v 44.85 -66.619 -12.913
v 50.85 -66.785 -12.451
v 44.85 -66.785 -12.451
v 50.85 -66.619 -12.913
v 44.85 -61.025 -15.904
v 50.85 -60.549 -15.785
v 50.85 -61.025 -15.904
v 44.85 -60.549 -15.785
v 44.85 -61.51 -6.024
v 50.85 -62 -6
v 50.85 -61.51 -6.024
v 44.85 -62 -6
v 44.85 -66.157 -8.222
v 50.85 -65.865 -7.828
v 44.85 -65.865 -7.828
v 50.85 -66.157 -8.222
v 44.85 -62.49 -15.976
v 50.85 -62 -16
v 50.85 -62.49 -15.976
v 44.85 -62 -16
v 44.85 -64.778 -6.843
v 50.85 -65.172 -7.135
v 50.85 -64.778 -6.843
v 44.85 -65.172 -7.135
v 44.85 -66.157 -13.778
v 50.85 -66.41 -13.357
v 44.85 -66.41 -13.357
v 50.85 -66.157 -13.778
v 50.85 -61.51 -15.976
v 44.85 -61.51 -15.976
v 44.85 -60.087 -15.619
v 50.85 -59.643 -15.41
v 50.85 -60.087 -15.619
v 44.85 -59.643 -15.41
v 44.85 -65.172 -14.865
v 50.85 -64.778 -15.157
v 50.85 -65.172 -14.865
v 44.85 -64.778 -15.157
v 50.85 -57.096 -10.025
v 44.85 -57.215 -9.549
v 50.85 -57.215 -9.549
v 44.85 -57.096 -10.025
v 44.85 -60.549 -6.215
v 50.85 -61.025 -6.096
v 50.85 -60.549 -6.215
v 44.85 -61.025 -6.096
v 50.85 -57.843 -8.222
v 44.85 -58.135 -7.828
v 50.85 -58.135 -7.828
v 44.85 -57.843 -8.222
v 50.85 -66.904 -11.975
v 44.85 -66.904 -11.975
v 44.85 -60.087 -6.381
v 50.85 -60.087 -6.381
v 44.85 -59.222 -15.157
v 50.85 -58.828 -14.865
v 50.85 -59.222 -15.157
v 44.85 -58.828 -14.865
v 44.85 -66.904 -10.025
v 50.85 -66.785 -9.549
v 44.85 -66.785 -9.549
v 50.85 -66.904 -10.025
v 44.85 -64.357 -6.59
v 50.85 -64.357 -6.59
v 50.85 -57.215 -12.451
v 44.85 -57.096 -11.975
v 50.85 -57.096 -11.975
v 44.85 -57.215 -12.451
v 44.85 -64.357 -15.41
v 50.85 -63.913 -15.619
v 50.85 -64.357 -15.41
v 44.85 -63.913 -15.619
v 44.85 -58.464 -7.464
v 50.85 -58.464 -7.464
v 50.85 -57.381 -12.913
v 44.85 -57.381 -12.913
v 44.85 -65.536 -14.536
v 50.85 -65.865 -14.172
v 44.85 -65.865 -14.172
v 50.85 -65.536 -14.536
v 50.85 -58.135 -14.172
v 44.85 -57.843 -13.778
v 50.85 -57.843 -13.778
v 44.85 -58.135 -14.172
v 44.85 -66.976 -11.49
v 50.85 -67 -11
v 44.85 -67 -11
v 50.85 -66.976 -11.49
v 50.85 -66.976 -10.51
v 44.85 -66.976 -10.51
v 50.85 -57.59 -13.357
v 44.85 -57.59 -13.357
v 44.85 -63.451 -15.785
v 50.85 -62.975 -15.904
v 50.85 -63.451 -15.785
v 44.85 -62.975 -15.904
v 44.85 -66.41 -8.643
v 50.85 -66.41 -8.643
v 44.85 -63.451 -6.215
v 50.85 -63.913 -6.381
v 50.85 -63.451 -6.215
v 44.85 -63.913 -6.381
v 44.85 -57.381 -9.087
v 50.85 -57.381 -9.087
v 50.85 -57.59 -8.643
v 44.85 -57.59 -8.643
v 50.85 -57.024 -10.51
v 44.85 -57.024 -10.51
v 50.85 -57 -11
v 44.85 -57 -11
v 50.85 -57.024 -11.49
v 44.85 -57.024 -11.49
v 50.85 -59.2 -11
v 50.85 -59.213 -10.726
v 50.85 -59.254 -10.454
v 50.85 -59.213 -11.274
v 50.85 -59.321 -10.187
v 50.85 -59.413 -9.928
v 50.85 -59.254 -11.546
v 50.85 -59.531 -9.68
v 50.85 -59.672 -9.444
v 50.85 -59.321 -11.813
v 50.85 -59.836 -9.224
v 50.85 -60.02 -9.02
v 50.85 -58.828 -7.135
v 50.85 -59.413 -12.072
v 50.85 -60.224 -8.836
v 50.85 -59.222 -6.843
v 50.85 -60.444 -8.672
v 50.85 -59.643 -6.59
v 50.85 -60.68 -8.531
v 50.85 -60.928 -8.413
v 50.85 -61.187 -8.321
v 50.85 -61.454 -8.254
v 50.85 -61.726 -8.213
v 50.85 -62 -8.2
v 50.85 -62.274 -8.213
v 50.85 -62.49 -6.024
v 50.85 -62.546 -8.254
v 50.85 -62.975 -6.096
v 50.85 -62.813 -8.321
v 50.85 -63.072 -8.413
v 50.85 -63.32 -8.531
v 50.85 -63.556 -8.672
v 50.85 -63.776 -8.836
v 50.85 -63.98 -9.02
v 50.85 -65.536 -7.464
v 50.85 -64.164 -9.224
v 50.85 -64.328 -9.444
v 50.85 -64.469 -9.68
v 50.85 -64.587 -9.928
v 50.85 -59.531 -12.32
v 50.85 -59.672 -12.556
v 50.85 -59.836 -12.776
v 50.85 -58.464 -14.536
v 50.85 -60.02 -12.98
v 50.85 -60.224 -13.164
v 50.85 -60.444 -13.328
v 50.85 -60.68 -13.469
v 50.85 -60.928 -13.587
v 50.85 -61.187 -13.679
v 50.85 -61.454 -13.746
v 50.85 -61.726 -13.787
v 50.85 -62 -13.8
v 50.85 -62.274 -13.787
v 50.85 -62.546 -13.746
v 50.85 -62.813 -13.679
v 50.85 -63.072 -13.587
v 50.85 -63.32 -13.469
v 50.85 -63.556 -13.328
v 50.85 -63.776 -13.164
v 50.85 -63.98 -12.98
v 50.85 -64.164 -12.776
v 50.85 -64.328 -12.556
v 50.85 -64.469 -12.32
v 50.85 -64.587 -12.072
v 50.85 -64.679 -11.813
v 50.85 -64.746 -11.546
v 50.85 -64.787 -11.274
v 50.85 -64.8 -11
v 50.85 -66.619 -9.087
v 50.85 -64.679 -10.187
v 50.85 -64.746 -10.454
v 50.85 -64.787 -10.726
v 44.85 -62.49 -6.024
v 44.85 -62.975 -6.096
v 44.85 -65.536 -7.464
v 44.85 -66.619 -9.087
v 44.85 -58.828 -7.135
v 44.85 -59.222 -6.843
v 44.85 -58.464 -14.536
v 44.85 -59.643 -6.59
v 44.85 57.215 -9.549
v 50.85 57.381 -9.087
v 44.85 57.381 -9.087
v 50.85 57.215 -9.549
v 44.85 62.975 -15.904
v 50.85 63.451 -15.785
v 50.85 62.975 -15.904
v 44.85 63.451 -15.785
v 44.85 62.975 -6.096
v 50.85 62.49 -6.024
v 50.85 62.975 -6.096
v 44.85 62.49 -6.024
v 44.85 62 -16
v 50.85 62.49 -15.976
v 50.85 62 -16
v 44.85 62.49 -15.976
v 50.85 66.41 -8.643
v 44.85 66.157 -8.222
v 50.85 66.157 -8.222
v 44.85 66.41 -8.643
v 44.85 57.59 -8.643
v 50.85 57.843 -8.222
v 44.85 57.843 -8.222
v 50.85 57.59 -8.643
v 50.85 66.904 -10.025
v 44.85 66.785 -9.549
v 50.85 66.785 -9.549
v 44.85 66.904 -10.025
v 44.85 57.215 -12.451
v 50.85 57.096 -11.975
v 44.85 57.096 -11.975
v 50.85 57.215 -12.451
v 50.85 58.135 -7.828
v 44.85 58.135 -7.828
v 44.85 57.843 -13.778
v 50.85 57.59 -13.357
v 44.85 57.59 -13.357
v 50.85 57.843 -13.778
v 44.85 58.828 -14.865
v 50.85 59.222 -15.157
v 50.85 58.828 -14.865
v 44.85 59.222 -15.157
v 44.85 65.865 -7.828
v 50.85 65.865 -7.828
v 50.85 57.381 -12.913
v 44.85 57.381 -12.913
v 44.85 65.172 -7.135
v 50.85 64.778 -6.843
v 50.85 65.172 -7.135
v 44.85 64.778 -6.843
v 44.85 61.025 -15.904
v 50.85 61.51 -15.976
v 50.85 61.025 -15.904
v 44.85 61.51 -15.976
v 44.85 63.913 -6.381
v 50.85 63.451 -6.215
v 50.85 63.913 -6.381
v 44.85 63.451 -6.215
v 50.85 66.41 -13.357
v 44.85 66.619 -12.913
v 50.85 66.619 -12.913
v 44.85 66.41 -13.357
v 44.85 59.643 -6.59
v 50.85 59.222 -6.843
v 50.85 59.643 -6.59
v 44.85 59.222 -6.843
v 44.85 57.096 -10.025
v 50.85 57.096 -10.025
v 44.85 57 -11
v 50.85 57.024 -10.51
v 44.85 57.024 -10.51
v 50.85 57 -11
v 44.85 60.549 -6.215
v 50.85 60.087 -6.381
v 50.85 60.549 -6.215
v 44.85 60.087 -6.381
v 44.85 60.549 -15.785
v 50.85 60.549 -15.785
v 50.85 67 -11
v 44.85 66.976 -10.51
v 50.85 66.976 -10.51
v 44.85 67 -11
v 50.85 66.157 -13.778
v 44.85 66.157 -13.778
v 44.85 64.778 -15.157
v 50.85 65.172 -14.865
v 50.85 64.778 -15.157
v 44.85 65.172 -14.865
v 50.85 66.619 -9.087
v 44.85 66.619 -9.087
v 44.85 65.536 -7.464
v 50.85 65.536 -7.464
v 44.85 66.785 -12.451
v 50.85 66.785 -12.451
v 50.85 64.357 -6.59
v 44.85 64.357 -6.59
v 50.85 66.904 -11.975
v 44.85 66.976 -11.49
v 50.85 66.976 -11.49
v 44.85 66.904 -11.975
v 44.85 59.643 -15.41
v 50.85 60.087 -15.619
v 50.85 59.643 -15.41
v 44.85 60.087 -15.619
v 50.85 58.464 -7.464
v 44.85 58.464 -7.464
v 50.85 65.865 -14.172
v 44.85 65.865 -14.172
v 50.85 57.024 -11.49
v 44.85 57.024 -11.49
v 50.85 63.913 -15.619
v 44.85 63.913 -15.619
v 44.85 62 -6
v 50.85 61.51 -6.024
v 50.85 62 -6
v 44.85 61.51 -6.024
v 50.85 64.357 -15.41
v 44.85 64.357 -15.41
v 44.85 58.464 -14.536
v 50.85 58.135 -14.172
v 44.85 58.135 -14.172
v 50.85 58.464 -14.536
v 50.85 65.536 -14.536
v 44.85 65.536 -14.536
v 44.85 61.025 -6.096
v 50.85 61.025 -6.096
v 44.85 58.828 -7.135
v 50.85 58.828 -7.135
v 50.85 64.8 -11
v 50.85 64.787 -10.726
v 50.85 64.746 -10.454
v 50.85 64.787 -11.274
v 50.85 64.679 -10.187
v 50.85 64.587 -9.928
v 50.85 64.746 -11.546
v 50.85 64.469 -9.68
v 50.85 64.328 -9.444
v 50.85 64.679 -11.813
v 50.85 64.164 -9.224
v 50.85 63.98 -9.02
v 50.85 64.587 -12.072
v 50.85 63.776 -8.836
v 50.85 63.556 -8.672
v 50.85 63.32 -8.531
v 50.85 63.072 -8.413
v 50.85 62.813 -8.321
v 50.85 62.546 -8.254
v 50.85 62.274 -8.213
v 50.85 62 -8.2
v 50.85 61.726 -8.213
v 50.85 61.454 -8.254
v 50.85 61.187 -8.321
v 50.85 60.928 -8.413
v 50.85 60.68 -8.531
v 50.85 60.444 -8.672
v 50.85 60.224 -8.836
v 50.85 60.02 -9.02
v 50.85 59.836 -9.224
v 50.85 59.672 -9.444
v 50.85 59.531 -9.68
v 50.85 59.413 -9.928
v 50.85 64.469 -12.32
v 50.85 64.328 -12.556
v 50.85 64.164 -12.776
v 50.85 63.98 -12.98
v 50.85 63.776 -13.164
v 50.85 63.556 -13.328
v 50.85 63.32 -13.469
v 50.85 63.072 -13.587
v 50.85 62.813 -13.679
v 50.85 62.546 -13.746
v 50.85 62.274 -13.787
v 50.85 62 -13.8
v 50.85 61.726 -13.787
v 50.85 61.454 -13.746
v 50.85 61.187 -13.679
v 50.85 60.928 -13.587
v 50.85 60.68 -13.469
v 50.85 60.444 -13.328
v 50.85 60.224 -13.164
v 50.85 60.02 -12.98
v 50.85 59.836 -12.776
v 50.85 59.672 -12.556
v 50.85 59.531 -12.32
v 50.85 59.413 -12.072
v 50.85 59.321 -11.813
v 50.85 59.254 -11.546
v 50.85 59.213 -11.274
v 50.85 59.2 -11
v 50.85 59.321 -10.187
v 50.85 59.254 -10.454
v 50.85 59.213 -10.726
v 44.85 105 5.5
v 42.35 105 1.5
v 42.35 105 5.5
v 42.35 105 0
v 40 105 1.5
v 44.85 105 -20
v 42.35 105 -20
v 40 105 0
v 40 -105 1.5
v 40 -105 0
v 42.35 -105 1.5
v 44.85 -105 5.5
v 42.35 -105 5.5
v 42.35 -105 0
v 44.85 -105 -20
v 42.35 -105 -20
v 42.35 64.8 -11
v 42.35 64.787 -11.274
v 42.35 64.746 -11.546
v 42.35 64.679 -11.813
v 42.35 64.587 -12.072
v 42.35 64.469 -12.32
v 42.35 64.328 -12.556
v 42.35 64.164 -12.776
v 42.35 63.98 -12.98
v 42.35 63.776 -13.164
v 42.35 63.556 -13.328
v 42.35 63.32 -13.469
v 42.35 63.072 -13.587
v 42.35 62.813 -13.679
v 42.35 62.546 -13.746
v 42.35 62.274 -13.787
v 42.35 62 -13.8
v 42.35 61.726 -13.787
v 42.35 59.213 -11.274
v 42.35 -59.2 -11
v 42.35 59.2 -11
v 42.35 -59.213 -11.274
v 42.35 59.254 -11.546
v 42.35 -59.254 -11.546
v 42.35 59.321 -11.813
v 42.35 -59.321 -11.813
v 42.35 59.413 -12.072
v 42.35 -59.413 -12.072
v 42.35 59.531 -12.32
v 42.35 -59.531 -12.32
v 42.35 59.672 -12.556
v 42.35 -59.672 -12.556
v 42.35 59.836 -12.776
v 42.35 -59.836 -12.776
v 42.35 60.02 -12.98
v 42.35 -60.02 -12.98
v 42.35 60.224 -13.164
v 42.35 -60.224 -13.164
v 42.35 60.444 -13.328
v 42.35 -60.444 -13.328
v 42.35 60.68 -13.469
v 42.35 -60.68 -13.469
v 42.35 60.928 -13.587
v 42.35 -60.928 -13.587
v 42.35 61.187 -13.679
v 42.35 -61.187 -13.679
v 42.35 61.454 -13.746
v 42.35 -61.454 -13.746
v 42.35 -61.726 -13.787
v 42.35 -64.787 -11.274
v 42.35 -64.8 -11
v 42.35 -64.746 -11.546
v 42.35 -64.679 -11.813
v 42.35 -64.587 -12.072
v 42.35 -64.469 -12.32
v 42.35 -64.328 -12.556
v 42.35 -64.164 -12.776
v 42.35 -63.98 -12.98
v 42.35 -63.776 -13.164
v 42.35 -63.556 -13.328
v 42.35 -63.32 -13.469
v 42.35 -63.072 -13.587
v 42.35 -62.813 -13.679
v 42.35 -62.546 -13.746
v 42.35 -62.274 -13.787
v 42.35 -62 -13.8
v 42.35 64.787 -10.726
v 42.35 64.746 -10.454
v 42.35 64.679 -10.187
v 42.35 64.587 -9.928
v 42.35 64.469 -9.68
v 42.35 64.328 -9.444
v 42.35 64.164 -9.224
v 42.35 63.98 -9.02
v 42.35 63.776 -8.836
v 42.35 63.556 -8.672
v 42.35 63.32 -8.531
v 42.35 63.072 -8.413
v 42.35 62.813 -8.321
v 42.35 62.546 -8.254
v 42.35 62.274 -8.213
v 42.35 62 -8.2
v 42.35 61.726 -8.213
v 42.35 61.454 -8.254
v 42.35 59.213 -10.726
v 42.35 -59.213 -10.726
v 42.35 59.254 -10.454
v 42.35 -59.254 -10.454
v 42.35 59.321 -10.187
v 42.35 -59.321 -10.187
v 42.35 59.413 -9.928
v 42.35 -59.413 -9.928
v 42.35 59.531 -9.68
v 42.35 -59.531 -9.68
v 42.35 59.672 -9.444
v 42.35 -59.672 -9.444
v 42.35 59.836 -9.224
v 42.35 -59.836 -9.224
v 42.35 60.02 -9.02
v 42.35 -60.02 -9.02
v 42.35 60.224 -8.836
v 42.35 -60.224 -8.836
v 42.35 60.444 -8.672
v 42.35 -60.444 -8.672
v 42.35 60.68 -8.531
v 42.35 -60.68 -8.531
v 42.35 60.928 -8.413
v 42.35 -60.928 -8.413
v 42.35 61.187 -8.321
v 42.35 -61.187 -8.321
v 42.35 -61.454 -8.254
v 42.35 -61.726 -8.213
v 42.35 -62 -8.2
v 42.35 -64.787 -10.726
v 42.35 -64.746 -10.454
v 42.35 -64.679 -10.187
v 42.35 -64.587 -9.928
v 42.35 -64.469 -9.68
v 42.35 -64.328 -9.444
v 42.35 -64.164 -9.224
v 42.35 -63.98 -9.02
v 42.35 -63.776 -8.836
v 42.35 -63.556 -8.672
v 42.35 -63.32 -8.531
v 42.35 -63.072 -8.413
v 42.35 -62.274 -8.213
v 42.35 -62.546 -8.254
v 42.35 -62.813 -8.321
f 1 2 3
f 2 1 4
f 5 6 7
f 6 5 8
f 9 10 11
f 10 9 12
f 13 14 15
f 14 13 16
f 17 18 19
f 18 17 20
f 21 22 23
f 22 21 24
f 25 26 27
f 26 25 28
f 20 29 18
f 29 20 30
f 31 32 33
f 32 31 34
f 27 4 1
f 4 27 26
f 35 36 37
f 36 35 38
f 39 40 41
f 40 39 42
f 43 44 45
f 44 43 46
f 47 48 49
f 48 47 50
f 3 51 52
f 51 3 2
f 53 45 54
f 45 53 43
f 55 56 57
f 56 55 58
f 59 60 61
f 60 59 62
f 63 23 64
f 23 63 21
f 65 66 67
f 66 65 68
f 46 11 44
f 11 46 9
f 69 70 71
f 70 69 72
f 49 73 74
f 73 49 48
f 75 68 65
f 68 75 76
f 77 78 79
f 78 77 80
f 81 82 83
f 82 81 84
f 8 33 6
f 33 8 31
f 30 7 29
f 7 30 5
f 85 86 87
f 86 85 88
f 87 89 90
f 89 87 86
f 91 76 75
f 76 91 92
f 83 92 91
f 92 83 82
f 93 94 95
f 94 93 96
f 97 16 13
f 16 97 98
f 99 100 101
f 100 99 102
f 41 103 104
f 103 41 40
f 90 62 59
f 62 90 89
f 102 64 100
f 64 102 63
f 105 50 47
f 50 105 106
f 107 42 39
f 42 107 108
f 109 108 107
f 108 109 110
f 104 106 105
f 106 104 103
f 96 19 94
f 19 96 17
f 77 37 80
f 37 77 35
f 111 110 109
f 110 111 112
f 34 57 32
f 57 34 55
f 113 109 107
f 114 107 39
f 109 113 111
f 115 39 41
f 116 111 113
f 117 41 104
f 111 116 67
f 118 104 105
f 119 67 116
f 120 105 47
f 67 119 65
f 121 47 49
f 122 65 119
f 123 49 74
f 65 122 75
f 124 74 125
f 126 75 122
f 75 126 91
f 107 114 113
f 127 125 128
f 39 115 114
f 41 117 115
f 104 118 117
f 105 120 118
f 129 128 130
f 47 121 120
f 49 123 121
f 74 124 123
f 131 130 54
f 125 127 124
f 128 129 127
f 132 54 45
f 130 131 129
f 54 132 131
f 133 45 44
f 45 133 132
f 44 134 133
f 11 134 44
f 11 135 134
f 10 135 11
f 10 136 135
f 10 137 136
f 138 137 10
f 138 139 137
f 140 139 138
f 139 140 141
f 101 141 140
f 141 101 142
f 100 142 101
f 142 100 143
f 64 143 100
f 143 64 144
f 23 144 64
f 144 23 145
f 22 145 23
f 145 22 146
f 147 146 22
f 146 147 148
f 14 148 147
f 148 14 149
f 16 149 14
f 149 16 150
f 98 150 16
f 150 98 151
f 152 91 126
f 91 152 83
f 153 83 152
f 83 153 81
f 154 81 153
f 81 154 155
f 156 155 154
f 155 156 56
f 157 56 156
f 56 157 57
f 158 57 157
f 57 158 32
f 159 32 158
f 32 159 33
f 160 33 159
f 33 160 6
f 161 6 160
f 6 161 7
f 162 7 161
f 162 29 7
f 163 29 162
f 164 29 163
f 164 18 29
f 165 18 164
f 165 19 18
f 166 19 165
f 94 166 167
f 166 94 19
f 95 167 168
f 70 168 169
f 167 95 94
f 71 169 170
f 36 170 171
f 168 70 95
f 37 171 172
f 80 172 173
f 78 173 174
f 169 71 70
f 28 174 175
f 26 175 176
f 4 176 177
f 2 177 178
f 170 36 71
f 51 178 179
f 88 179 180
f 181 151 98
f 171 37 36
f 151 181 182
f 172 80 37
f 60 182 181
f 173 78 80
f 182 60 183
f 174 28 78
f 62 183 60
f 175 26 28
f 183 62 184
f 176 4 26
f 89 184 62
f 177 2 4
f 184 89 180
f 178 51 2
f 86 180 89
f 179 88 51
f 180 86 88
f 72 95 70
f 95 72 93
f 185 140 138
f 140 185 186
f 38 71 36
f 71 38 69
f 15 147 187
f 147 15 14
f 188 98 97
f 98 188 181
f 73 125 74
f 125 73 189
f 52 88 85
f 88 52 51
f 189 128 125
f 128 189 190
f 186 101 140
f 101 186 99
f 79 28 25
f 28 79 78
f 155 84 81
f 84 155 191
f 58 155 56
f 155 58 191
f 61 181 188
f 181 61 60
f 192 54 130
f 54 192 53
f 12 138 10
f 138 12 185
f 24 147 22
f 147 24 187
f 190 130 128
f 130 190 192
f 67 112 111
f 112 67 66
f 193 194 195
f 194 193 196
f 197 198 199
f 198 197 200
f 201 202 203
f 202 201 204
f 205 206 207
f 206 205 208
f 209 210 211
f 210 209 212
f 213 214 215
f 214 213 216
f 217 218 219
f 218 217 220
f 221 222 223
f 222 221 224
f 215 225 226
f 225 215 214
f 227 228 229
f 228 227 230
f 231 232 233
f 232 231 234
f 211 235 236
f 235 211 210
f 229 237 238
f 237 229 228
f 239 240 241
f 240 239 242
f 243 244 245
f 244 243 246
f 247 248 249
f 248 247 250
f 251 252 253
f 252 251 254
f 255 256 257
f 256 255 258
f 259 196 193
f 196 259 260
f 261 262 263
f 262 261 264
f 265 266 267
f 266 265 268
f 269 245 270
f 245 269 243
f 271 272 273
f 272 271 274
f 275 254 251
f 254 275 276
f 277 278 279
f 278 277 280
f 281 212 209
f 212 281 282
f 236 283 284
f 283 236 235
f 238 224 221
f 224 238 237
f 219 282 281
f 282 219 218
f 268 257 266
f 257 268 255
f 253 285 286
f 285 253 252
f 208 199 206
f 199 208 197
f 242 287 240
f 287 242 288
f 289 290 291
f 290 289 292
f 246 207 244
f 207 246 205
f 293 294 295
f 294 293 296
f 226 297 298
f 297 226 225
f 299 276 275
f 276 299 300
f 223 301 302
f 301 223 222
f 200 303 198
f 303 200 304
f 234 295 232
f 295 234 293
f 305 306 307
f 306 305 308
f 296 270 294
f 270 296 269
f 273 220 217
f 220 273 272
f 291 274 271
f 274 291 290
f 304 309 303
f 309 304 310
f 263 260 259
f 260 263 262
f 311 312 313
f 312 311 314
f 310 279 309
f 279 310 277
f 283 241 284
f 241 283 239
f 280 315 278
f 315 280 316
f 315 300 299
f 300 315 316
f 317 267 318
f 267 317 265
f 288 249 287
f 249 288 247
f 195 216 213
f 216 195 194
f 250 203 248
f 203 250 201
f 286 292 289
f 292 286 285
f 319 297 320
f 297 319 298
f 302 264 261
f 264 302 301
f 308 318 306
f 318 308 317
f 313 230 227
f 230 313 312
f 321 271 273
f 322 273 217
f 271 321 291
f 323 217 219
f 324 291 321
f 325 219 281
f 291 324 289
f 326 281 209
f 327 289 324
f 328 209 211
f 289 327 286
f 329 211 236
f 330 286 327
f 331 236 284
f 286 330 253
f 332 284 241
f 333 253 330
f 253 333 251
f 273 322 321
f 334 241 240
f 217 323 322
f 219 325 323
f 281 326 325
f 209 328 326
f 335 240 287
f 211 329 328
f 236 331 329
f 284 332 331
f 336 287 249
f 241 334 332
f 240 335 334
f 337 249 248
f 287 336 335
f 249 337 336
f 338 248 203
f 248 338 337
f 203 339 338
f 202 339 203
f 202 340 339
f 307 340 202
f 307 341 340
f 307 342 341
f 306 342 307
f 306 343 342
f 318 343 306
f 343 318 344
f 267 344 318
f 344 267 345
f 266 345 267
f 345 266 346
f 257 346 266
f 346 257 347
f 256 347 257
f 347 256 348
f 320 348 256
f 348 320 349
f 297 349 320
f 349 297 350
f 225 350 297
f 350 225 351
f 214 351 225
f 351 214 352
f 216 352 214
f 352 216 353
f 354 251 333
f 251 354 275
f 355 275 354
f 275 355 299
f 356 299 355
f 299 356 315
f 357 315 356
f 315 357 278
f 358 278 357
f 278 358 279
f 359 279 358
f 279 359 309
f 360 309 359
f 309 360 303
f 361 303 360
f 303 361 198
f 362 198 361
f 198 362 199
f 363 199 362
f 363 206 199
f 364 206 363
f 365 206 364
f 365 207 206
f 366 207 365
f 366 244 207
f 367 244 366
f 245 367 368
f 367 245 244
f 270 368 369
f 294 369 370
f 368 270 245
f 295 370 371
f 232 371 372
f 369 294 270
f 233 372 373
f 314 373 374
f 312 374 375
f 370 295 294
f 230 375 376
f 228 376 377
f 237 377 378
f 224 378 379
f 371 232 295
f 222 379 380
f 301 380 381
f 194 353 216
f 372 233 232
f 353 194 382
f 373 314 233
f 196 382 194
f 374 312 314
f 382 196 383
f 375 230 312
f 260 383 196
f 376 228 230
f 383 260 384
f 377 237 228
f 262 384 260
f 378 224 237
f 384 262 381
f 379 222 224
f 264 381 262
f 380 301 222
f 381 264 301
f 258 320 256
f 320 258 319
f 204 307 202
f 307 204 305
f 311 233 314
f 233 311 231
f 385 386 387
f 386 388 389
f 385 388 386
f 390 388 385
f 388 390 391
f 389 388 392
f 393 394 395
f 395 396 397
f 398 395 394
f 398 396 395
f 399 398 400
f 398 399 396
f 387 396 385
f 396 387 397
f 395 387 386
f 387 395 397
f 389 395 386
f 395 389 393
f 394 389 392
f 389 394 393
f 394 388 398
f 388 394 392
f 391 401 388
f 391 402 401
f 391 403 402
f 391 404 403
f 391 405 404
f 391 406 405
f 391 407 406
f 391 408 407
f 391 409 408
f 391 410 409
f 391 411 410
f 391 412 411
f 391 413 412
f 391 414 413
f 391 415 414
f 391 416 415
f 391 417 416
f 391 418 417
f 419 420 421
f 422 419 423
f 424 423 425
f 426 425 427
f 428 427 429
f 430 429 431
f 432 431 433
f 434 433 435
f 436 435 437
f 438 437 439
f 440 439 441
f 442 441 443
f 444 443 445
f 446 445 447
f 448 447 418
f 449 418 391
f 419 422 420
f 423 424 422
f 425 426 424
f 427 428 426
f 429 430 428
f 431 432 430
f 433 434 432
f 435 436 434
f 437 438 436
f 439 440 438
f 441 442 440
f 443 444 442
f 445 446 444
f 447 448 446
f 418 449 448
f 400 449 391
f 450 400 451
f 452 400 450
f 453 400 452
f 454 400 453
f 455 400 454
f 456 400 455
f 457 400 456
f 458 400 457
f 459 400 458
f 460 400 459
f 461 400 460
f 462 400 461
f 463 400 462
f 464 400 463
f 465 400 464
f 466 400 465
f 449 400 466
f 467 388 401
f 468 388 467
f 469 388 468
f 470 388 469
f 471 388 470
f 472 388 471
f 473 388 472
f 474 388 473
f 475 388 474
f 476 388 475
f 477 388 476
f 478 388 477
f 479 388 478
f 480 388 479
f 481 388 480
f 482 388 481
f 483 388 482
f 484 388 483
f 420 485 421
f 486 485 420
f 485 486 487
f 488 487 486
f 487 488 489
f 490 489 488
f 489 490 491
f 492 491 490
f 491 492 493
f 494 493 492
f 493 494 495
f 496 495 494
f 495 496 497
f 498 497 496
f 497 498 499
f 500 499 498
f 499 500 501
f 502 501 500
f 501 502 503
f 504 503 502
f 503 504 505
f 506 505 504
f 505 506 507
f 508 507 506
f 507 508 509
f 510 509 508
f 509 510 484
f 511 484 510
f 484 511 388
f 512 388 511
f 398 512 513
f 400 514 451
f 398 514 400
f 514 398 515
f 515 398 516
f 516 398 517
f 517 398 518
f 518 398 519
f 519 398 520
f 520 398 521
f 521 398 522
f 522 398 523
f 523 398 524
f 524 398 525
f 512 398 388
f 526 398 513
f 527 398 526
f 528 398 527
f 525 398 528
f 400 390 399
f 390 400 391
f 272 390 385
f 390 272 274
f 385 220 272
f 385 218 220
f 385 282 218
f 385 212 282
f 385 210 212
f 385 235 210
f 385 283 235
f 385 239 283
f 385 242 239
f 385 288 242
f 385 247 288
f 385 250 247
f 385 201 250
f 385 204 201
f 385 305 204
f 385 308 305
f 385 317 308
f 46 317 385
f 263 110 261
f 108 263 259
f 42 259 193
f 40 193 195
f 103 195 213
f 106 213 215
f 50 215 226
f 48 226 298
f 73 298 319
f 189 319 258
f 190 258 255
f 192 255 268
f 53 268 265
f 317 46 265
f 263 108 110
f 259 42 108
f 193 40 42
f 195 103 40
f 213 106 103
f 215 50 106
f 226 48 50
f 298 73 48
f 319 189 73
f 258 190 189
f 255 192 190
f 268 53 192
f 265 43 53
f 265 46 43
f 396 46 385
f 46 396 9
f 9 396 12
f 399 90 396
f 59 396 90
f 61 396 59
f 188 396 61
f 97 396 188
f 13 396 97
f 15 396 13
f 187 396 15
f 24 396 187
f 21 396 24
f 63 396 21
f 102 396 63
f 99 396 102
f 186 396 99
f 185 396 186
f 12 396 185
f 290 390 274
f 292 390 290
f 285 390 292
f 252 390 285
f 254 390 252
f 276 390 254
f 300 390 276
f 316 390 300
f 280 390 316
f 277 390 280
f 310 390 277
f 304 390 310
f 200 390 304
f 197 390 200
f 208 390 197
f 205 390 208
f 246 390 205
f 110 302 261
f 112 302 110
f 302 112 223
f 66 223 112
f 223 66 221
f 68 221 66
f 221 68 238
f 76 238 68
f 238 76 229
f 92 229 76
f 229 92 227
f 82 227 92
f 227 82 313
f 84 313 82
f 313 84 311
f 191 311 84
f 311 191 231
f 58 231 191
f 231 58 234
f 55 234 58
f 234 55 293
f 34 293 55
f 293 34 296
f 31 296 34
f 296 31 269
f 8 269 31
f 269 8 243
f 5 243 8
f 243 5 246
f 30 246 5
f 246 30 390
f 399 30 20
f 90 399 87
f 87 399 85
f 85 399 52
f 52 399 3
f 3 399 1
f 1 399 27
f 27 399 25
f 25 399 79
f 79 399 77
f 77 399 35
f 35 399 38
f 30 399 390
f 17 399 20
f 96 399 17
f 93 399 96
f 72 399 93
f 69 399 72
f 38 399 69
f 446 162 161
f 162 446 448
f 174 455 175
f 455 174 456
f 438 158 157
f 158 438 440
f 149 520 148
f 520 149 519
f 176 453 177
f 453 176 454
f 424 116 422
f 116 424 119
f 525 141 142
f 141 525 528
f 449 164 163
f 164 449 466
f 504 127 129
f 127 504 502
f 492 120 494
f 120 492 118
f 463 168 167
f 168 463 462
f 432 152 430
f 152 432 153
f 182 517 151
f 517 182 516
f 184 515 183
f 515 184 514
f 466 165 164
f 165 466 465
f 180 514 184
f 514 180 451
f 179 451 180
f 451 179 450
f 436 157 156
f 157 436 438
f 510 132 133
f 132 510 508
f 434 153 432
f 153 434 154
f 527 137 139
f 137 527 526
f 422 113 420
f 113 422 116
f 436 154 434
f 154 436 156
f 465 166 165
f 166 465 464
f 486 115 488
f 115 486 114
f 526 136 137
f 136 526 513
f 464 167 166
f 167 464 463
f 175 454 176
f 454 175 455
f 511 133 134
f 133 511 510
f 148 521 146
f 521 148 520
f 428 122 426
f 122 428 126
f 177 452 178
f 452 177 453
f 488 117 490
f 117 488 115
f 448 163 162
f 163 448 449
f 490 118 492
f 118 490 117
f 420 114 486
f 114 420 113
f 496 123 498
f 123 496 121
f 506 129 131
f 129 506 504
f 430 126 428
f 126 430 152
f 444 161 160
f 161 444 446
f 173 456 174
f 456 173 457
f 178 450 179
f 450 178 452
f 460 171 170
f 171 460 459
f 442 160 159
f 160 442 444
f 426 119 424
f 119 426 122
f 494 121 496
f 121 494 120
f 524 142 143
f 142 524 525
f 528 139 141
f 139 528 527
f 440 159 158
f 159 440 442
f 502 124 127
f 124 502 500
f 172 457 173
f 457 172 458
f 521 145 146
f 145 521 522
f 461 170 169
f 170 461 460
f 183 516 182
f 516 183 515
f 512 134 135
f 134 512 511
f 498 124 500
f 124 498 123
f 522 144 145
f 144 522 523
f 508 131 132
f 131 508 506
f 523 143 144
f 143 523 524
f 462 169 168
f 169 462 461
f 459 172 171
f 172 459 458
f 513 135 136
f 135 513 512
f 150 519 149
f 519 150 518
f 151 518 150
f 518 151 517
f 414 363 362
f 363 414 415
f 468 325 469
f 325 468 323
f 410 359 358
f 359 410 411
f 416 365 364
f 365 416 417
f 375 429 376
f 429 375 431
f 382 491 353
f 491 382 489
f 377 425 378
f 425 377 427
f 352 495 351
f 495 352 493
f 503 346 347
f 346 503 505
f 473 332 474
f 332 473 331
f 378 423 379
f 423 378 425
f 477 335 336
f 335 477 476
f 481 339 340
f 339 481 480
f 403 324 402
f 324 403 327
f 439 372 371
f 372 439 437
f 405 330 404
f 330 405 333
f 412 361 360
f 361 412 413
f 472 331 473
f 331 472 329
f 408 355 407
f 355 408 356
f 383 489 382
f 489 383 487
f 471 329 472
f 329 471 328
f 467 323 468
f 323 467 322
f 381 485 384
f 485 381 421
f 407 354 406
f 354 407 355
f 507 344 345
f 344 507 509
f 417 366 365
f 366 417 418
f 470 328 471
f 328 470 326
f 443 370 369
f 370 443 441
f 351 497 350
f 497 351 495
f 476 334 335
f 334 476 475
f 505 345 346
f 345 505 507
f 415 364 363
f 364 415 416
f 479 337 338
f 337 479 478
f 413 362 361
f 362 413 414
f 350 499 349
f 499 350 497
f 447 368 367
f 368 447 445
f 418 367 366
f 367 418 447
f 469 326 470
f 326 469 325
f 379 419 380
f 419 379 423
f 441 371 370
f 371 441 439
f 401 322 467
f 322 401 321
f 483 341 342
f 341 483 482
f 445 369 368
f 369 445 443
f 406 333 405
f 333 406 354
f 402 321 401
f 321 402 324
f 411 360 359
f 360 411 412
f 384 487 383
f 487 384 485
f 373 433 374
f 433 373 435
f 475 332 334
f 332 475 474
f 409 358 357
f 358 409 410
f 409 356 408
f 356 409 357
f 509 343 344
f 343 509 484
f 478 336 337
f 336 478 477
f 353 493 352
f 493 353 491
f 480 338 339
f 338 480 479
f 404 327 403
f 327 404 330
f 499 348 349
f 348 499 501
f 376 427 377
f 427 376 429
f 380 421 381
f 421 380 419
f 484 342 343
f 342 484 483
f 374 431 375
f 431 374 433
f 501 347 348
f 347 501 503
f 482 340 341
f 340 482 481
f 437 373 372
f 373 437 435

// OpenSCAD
// file: owon_tray_common.scad
// owon_tray_common.scad — shared dimensions for the OWON SPM8104 top tray.
//
// Measured on the actual unit (the datasheet's 82 mm width is WRONG):
//   lid width  84.30 mm  (calipers)
//   lid length ~226 mm   (flat all the way to the plastic front bezel)
//   height     142 mm    (spec)
//   venting    rear fan + side slots low on the case — skirts stay well above
//
// The 84.30 mm width is the happy accident that makes this work: a 2-cell
// Clickfinity plate is exactly 84.00 mm, so it sits flush with ~0.15 mm of case
// showing per side. 5 cells (210 mm) fits the length with ~16 mm to spare.

/* [Case] */
CASE_W   = 84.30;  // measured lid width
CASE_CLR = 0.40;   // total slip clearance so the clamp drops on

/* [Tray] */
GX = 2;            // cells across (84.00 mm — flush on the lid)
GY = 5;            // cells deep  (210 mm)
PLATE_H_ = 4.00;   // must match PLATE_H in lib/clickfinity.scad

/* [Clamp rail] */
SKIRT_T     = 2.50;  // skirt wall thickness
SKIRT_D     = 20.0;  // how far the skirt drops down the case side.
                     //   Keep SHORT — the side vents sit lower down the case.
// NOTE: the rail supports the plate from BELOW, it does not hook over it.
// A Gridfinity bin is 41.5 mm in a 42 mm cell — only 0.25 mm of plate rim per
// side. There is nothing to clamp over: any inward flange lands on top of the
// outer-row bins and stops them seating. So: a lip under the plate edge, and an
// upstand beside it.
LIP_IN   = 2.00;   // how far the lip reaches inward under the plate edge
LIP_T    = 1.50;   // lip thickness — the plate rides this far above the lid
RAIL_LEN    = GY*42; // rail runs the full plate length

/* [Clamp screws — M4 heat-set insert + M4 machine screw] */
// The boss takes a brass M4 heat-set insert (you have the M2–M6 kit); an M4
// machine screw threads through it and its tip presses the case. VERIFY HS_D
// against your actual inserts — install diameter varies by brand (a common M4
// heat-set wants ~5.6 mm; measure yours or check the insert datasheet).
HS_D       = 5.60;   // heat-set insert install hole diameter (M4) — VERIFY
HS_L       = 8.00;   // insert length (bore depth from the outer boss face)
BOSS_OD    = 10.0;   // boss outer diameter
BOSS_EXT   = 6.00;   // how far the boss stands off the outer skirt face
SCREW_Z    = -11.0;  // screw height on the skirt (below the lid line)
SCREW_Y    = 62.0;   // +/- screw position along the rail
// Use an M4 machine screw ~16–20 mm long. A stick-on rubber/felt dot on the tip
// keeps it from marring the case.

// Derived
PLATE_W  = GX*42;
PLATE_L  = GY*42;
SKIRT_IN = CASE_W/2 + CASE_CLR/2;   // inner face of the skirt
SKIRT_OUT= SKIRT_IN + SKIRT_T;
// main file
// owon_tray_rail.scad — clamp rail for the OWON SPM8104 top tray.
//
// Part 2 of 2. **Print TWO** (identical, one per side).
//
// Each rail is a hook in section: a lip the tray plate rests on, an upstand that
// captures the plate sideways, and a skirt down the case side. Two M4 machine
// screws per rail (threaded into brass heat-set inserts) press against the case;
// tightening squeezes the case between the two rails AND pins the plate down.
// Nothing pierces the plate, nothing is glued to the instrument, and the whole
// thing lifts off when you back the screws out.
//
// ASSEMBLY: heat an M4 brass insert into each boss (from the OUTER face), then
// thread an M4 machine screw (~16–20 mm) through it. Rubber/felt dot on the tip.
//
// Why screws and not a snap-on friction clamp: PETG creeps under sustained
// tension. A spring clamp would be tight in week one and loose by month three.
// A screw is a positive grip with no standing load — and it absorbs the
// dimensional slop you get between a datasheet and a real case.
//
// PRINT: lay it on the skirt's OUTER face (flange pointing up) — prints as an
// L on its back, no supports. PETG or PLA both fine here; this part isn't a
// spring. Add a felt/rubber dot on each screw tip so it doesn't mar the case.

include <owon_tray_common.scad>

$fn = 64;

// Cross-section in (x, z). The plate rides on the LIP and is captured laterally
// by the UPSTAND — nothing overhangs it (see LIP_IN note in common: a Gridfinity
// bin leaves only 0.25 mm of rim, so there is nothing to hook over).
//   lip      z 0 .. LIP_T           , x  PLATE_W/2-LIP_IN .. SKIRT_IN  (on the lid)
//   upstand  z 0 .. LIP_T+PLATE_H_  , x  SKIRT_IN .. SKIRT_OUT         (beside plate)
//   skirt    z -SKIRT_D .. 0        , x  SKIRT_IN .. SKIRT_OUT         (down the case)
_TOP = LIP_T + PLATE_H_;   // upstand height = flush with the seated plate's top
function _rail_profile() = [
    [PLATE_W/2 - LIP_IN,  0],       // lip inner, underside (rests on the lid)
    [PLATE_W/2 - LIP_IN,  LIP_T],   // lip inner, top — plate sits here
    [SKIRT_IN,            LIP_T],
    [SKIRT_IN,            _TOP],    // upstand inner face, captures the plate
    [SKIRT_OUT,           _TOP],
    [SKIRT_OUT,          -SKIRT_D], // outer face, all the way down the case side
    [SKIRT_IN,           -SKIRT_D],
    [SKIRT_IN,            0],
];

module rail() {
    difference() {
        union() {
            // the hook, extruded along the rail length. rotate([90,0,0]) maps the
            // profile's second coord to world +Z (skirt DOWN, flange UP) and
            // extrudes along -Y; the translate re-centres it.
            translate([0, RAIL_LEN/2, 0]) rotate([90, 0, 0])
                linear_extrude(RAIL_LEN) polygon(_rail_profile());
            // bosses on the outer skirt face — depth for the heat-set insert.
            // Start 1 mm INSIDE the skirt so the boss base fuses volumetrically
            // instead of leaving a circle of faces coincident with the skirt
            // plane (that coincidence renders as non-manifold edges on some
            // OpenSCAD builds — 64 per boss — and fails strict validation).
            for (y = [-SCREW_Y, SCREW_Y])
                translate([SKIRT_OUT - 1, y, SCREW_Z]) rotate([0, 90, 0])
                    cylinder(h = BOSS_EXT + 1, d = BOSS_OD);
        }
        // insert bore: HS_D from the OUTER boss face, HS_L deep (heat the insert
        // in here). Continues at HS_D through the rest so the screw tip exits the
        // inner face to press the case.
        for (y = [-SCREW_Y, SCREW_Y])
            translate([SKIRT_IN - 1, y, SCREW_Z]) rotate([0, 90, 0])
                cylinder(h = SKIRT_T + BOSS_EXT + 2, d = HS_D);
    }
}

rail();
